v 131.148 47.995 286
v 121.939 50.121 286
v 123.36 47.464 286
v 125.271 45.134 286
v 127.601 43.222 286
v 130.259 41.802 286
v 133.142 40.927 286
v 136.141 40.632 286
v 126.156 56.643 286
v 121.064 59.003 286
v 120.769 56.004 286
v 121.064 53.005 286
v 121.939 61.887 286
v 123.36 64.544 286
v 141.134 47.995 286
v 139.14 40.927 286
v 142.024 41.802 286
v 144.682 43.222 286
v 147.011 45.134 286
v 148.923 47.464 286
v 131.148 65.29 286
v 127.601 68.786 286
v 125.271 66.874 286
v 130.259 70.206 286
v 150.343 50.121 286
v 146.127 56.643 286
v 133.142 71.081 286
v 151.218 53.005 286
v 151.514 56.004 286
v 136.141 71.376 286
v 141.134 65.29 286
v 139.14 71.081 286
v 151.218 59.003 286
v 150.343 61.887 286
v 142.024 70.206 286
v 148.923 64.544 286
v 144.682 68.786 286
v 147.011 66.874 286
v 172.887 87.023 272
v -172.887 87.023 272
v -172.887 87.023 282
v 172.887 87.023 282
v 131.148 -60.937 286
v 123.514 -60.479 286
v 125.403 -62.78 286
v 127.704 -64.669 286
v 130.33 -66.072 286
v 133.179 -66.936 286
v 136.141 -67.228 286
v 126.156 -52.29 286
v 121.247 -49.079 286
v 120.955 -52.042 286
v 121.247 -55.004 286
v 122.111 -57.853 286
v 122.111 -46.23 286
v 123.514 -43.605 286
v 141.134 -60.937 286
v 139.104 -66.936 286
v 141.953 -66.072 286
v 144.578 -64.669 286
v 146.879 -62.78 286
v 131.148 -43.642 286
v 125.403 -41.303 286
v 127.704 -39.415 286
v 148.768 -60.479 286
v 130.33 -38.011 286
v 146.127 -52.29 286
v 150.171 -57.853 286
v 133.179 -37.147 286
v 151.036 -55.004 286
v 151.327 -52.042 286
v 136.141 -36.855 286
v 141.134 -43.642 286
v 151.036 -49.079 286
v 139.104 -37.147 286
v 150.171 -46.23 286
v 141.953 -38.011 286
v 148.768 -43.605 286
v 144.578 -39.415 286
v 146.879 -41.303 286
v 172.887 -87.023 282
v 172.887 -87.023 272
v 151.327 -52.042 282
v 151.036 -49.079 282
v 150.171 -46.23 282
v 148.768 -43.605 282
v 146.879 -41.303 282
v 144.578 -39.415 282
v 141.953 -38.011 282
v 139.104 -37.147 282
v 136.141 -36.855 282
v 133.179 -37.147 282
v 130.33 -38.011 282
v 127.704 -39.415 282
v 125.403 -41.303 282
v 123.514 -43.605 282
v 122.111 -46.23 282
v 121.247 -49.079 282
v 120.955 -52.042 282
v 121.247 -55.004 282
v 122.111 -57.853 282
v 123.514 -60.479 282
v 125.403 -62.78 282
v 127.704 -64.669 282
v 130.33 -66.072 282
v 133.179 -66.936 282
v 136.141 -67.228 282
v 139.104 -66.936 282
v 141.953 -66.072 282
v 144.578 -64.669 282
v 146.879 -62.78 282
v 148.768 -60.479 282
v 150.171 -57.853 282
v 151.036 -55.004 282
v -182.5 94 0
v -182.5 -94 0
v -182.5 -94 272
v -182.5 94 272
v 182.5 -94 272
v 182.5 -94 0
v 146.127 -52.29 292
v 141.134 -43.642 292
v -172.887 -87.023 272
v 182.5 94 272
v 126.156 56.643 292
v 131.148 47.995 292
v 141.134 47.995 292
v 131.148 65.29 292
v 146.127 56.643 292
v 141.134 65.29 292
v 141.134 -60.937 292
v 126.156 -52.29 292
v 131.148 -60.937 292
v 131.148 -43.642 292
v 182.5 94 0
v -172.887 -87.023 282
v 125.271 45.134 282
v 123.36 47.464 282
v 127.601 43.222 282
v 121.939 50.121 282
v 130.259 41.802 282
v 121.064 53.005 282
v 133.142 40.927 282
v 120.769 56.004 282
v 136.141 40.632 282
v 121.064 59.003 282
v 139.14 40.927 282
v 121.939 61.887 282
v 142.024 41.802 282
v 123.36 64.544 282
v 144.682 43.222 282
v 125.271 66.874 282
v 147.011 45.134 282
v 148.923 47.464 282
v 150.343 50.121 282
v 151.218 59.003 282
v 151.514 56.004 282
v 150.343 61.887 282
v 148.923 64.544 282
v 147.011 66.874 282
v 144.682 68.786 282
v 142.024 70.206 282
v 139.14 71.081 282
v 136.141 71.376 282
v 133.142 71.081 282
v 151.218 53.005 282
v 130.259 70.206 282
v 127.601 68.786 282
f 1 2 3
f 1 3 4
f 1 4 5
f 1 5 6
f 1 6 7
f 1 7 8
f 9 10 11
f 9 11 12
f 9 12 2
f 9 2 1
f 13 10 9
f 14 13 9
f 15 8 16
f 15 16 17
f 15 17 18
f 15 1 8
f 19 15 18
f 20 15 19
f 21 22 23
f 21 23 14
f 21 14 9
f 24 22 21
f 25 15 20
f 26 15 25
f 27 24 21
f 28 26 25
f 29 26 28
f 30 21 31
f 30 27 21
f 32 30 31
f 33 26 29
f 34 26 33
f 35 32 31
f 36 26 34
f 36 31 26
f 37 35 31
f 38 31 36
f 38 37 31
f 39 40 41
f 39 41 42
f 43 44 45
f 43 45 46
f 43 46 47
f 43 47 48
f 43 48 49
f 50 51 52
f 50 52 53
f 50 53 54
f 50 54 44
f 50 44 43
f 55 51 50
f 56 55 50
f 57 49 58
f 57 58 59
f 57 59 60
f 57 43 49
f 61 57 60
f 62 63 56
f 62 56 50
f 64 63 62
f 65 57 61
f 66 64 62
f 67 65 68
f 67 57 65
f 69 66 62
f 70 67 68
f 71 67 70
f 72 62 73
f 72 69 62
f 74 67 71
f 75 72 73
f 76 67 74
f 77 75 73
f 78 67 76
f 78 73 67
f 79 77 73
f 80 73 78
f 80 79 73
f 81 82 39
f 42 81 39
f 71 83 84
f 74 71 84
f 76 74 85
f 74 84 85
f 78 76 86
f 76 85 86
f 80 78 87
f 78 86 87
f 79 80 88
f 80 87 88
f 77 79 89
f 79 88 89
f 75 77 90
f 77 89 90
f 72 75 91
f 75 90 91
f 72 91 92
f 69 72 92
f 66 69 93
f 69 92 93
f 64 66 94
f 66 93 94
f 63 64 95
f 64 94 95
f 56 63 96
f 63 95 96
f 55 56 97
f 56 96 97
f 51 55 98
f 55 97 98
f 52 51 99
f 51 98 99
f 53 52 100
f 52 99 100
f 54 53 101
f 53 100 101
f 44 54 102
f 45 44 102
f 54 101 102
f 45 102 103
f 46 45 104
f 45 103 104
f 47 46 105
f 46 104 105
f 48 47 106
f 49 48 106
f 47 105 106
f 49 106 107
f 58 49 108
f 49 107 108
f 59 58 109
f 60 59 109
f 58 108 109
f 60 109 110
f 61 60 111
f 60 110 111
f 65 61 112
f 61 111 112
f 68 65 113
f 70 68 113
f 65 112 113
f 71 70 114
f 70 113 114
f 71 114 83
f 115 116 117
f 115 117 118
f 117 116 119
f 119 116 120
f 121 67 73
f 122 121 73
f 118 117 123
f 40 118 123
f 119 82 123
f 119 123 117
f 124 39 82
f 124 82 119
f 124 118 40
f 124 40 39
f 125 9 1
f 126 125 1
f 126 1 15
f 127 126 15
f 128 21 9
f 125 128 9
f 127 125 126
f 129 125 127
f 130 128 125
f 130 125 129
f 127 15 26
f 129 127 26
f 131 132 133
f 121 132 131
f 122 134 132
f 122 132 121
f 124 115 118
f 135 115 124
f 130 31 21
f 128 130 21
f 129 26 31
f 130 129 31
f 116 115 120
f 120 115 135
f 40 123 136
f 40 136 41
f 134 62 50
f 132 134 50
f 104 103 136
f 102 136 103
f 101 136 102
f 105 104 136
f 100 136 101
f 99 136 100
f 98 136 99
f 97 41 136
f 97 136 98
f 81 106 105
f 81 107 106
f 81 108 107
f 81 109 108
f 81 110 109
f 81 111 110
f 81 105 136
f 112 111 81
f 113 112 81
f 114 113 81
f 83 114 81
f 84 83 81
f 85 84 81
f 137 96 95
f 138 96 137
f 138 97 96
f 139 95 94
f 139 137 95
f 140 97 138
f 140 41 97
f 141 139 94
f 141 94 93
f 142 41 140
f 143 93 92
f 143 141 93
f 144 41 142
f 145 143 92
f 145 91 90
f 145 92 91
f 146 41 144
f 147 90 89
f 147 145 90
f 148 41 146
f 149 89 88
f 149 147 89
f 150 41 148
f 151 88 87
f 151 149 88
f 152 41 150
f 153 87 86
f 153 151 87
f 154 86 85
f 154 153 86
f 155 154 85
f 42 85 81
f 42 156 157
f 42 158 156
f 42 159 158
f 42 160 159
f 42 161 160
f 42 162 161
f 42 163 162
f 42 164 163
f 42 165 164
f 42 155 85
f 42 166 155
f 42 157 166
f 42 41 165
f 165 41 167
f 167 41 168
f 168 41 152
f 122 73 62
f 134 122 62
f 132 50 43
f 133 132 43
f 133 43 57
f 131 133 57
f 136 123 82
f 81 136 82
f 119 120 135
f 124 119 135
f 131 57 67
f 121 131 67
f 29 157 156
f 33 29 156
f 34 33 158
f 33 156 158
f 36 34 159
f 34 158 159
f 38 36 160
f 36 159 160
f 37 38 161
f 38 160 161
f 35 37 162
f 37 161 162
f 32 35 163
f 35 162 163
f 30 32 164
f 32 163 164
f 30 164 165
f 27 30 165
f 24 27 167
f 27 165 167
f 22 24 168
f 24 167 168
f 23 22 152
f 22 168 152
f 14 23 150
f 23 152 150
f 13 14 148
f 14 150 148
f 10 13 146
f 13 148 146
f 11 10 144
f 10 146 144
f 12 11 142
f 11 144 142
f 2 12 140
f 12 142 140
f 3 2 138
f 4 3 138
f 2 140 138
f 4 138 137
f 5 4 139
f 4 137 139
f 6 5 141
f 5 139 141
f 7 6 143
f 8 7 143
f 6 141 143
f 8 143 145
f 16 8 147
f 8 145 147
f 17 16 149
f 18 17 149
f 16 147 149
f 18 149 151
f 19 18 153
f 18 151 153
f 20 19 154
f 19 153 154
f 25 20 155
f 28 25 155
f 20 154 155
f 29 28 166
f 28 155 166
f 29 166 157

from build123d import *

# Parameters (mm, degrees)
SKETCH2_W           = 365
SKETCH2_H           = 188
BOSS_EXTRUDE1_DEPTH = 272
SKETCH3_W           = 345.774876004
SKETCH3_H           = 174.045166382
BOSS_EXTRUDE2_DEPTH = 10
BOSS_EXTRUDE3_DEPTH = 10
SKETCH5_R           = 15.372297264
SKETCH5_R_2         = 15.186201359
BOSS_EXTRUDE4_DEPTH = 4


with BuildPart() as part:
    # Sketch2 → Boss-Extrude1 (new body)
    with BuildSketch(Plane.XY):
        Rectangle(SKETCH2_W, SKETCH2_H)
    extrude(amount=BOSS_EXTRUDE1_DEPTH)

    # Sketch3 → Boss-Extrude2 (add)
    with BuildSketch(Plane.XY.offset(272)):
        Rectangle(SKETCH3_W, SKETCH3_H)
    extrude(amount=BOSS_EXTRUDE2_DEPTH)

    # Sketch4 → Boss-Extrude3 (add)
    with BuildSketch(Plane.XY.offset(282)):
        Polygon((146.126879862, 56.64254241), (141.134054035, 65.290370416), (131.14840238, 65.290370416), (126.155576553, 56.64254241), (131.14840238, 47.994714404), (141.134054035, 47.994714404), align=None)
        Polygon((146.126879862, -52.289546401), (141.134054035, -43.641718394), (131.14840238, -43.641718394), (126.155576553, -52.289546401), (131.14840238, -60.937374407), (141.134054035, -60.937374407), align=None)
    extrude(amount=BOSS_EXTRUDE3_DEPTH)

    # Sketch5 → Boss-Extrude4 (add)
    with BuildSketch(Plane.XY.offset(282)):
        with Locations((136.141228208, 56.003971115)):
            Circle(SKETCH5_R)
        with Locations((136.141228208, -52.041649492)):
            Circle(SKETCH5_R_2)
    extrude(amount=BOSS_EXTRUDE4_DEPTH)


solid = part.part
